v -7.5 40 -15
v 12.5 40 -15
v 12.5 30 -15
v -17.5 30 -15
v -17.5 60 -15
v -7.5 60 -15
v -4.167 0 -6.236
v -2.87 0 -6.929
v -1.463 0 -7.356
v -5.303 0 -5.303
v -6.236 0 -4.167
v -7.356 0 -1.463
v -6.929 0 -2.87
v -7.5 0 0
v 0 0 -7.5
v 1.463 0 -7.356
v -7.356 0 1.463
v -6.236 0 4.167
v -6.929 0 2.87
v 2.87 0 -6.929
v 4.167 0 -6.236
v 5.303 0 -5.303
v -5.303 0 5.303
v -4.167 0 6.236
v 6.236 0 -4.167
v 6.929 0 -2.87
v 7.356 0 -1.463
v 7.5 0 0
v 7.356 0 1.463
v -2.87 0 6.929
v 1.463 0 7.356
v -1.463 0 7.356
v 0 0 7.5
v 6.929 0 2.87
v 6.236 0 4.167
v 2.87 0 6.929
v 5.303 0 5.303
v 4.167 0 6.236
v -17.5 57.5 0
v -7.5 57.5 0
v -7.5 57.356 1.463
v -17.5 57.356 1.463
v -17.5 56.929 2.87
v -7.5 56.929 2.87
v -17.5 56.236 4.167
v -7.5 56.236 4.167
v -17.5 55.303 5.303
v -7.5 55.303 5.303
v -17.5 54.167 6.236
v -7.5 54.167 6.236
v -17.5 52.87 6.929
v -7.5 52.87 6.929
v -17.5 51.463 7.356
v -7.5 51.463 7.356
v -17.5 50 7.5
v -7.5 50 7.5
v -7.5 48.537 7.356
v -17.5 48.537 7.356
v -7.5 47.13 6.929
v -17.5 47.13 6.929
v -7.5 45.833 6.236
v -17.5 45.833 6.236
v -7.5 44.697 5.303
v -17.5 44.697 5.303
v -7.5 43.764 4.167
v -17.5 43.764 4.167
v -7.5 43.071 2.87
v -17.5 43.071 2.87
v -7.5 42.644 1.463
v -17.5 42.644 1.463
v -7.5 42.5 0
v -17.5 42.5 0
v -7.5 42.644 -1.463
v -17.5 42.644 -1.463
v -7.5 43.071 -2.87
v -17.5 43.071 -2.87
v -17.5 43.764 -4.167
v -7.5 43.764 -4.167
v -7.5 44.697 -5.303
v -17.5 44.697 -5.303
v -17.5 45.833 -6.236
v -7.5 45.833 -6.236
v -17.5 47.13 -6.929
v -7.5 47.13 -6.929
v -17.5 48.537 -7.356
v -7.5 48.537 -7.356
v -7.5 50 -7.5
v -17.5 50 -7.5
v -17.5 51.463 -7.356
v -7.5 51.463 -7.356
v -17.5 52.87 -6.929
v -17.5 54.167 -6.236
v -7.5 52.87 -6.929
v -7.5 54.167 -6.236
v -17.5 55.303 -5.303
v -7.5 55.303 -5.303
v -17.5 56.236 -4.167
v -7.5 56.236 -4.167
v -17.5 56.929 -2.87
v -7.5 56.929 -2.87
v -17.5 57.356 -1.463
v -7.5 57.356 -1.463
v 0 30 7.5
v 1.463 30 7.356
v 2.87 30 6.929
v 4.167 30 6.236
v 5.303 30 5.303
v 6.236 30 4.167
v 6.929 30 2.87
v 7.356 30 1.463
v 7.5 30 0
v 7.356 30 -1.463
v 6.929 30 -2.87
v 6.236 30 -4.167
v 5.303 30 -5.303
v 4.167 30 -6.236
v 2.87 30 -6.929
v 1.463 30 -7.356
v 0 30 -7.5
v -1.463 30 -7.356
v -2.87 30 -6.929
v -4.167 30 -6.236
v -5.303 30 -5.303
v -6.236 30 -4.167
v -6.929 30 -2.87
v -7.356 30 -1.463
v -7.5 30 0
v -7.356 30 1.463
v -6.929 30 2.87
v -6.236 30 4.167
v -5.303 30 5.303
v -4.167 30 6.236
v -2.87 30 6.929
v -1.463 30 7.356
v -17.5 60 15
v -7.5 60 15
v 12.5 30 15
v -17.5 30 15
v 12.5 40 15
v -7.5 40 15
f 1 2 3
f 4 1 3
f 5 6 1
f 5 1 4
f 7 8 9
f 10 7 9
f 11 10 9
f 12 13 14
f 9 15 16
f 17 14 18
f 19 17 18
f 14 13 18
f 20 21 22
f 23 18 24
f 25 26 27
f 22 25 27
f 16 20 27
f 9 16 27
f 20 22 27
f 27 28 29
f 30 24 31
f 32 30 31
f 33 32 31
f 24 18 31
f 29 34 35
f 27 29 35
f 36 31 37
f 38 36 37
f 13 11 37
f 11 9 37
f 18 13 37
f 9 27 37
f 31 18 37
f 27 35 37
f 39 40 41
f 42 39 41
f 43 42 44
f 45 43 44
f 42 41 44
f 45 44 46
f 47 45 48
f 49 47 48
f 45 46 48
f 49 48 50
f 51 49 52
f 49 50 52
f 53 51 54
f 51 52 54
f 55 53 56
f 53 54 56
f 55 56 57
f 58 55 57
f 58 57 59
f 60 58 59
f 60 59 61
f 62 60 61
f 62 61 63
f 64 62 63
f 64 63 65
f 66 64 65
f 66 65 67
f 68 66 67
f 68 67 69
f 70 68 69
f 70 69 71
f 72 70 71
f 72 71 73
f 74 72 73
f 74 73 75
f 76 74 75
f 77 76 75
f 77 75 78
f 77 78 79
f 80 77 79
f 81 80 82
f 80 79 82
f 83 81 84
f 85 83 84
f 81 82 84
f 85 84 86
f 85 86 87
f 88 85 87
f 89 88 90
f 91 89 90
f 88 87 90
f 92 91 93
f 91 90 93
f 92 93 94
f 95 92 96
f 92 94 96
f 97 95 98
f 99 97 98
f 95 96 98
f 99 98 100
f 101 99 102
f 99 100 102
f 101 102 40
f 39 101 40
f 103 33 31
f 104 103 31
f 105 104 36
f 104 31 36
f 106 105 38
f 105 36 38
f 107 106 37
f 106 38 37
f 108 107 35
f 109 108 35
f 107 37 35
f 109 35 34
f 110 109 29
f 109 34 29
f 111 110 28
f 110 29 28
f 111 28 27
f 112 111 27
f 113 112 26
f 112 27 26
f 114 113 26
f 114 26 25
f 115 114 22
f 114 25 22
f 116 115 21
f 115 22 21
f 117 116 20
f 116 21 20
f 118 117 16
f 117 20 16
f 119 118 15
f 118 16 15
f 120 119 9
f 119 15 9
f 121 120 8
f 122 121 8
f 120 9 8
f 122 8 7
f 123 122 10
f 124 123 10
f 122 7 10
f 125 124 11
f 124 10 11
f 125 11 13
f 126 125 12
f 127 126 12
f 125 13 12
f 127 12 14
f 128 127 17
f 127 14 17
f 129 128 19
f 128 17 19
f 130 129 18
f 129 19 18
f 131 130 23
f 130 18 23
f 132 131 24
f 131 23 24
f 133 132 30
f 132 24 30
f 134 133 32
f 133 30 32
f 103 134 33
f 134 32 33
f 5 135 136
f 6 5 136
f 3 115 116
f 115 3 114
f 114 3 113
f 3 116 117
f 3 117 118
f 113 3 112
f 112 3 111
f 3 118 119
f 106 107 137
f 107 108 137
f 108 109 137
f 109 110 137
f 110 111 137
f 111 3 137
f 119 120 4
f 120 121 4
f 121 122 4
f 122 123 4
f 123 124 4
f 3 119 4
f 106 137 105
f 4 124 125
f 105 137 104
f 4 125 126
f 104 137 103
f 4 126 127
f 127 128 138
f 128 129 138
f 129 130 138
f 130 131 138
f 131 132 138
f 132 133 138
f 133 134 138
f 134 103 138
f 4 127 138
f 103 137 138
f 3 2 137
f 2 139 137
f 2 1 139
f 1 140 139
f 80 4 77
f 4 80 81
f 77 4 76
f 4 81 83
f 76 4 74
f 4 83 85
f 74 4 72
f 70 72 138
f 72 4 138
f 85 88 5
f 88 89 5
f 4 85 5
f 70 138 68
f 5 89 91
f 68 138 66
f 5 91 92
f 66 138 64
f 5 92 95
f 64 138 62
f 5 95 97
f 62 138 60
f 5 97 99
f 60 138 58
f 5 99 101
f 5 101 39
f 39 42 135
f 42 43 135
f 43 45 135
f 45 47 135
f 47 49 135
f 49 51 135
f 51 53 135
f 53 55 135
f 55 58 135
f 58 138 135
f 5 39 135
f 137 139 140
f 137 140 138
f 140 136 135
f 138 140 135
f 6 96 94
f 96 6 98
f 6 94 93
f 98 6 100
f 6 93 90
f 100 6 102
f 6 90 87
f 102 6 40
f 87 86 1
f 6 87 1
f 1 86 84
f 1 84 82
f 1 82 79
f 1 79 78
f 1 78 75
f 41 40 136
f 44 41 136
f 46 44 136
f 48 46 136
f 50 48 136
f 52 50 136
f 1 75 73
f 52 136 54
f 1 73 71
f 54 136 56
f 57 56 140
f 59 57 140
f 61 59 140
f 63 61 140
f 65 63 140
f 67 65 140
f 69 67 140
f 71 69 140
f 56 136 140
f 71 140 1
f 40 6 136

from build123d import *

# Parameters (mm, degrees)
SKETCH2_R           = 7.5
ROTAITING_PIN_DEPTH = 30
BODY_DEPTH          = 15
SKETCH4_R           = 7.5
HOLE_DEPTH          = 30


with BuildPart() as part:
    # Sketch2 → rotaiting pin (new body)
    with BuildSketch(Plane(origin=(0, 0, 0), x_dir=(1, 0, 0), z_dir=(0, 1, 0))):
        with Locations(Location((0, 0, 0), (0, 0, 270))):
            Circle(SKETCH2_R)
    extrude(amount=ROTAITING_PIN_DEPTH)

    # Sketch3 → body (add, symmetric)
    with BuildSketch(Plane.XY):
        Polygon((-17.5, 60), (-7.5, 60), (-7.5, 40), (12.5, 40), (12.5, 30), (-17.5, 30), align=None)
    extrude(amount=BODY_DEPTH, both=True)

    # Sketch4 → hole (cut)
    with BuildSketch(Plane(origin=(-7.5, 0, 0), x_dir=(0, 0, -1), z_dir=(1, 0, 0))):
        with Locations(Location((0, 50, 0), (0, 0, 90))):
            Circle(SKETCH4_R)
    extrude(amount=-HOLE_DEPTH, mode=Mode.SUBTRACT)


solid = part.part
